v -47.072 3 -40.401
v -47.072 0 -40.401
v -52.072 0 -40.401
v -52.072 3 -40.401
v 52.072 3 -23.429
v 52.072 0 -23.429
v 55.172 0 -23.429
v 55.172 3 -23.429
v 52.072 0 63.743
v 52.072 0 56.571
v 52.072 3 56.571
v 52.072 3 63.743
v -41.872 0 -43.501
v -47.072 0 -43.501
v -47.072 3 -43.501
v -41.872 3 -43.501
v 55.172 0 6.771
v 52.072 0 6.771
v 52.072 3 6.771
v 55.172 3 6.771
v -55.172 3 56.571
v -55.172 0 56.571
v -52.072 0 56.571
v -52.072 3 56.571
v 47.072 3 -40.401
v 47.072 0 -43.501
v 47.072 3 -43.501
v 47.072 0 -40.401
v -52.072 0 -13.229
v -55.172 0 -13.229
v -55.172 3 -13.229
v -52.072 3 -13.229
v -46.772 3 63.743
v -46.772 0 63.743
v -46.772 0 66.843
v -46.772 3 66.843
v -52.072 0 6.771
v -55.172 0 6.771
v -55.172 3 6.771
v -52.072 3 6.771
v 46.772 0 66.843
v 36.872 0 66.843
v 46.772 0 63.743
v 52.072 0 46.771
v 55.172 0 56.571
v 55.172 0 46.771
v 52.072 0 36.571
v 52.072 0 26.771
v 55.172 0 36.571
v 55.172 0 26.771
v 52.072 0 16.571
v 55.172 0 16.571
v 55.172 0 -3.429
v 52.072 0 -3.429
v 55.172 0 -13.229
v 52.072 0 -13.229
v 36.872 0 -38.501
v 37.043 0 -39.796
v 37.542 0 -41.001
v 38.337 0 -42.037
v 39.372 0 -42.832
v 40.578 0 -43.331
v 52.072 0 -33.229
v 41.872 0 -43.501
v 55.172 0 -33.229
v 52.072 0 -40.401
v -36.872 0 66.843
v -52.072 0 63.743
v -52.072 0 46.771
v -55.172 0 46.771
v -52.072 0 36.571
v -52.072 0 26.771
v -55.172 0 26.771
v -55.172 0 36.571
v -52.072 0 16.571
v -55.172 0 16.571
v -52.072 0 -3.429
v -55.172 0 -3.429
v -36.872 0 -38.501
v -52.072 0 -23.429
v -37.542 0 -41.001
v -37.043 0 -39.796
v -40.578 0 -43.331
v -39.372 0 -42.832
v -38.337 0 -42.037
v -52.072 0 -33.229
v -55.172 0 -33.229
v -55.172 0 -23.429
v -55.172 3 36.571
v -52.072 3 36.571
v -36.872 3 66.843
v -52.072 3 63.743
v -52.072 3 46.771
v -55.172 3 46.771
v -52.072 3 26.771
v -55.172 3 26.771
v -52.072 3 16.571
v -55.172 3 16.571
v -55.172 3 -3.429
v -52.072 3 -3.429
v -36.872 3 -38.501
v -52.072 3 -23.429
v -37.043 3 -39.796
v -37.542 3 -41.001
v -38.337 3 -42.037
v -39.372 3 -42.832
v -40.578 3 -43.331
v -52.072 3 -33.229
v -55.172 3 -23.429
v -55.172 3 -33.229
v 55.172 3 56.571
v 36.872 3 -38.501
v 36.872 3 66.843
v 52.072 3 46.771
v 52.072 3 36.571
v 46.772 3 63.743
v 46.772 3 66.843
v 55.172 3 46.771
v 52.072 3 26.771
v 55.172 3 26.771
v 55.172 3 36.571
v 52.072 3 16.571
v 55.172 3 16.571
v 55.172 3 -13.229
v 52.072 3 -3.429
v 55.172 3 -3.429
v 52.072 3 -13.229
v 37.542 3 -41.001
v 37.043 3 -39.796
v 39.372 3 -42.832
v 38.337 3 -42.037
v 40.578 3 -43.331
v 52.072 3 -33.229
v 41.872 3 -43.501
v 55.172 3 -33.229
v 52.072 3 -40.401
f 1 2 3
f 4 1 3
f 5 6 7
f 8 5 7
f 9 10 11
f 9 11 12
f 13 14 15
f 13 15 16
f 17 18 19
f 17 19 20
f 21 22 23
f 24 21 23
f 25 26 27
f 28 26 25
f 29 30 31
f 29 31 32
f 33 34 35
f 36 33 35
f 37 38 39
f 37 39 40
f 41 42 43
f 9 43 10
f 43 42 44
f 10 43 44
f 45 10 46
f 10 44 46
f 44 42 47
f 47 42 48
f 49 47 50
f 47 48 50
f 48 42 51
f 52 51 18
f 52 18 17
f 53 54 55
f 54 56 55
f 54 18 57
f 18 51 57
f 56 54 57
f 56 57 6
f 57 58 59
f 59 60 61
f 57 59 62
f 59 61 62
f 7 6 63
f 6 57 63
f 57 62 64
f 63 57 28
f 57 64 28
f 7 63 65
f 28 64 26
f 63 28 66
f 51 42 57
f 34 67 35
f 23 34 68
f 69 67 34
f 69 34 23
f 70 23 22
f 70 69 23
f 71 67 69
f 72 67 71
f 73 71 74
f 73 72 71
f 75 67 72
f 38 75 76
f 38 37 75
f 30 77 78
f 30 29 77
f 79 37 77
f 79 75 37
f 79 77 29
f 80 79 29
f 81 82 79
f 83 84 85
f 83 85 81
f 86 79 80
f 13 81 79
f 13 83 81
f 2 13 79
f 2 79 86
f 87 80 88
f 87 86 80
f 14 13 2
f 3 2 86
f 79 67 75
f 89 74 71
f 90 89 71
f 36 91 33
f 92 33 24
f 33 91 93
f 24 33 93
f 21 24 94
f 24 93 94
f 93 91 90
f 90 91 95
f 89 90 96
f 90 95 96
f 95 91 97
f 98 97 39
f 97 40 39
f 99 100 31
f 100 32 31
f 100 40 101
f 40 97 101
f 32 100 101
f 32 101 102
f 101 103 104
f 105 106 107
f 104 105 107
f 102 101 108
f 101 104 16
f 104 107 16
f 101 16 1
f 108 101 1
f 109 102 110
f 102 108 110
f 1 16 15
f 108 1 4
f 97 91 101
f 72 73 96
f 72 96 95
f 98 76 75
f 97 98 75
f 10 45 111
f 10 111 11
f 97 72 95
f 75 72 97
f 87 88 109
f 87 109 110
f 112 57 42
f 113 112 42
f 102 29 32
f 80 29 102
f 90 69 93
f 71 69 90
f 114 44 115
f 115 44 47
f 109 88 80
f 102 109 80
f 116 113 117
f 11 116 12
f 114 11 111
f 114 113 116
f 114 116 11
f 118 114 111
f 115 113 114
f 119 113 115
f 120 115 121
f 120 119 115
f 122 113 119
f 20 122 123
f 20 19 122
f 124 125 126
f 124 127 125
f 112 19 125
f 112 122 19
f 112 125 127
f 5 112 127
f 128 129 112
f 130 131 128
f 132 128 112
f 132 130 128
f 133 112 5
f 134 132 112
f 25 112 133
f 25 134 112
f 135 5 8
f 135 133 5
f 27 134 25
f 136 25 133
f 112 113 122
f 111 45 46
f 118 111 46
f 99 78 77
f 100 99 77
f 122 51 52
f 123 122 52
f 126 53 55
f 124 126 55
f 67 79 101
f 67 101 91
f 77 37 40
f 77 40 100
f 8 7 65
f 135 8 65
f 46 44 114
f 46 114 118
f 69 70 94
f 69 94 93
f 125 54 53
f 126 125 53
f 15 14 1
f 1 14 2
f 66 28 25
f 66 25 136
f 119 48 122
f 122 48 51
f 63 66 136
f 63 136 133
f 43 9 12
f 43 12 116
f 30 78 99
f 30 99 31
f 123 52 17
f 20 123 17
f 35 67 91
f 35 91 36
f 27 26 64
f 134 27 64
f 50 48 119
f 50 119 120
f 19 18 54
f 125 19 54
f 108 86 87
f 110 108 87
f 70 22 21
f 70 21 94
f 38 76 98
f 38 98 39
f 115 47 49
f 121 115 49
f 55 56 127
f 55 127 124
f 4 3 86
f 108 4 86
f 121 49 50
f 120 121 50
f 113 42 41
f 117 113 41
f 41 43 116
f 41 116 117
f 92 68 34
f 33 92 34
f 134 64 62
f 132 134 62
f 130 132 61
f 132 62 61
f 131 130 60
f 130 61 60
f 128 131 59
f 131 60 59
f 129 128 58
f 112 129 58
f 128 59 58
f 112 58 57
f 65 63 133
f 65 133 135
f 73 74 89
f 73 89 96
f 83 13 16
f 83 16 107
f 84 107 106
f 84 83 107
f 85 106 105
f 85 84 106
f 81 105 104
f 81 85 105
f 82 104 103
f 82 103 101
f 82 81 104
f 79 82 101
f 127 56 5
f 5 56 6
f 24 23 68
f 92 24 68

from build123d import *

# Parameters (mm, degrees)
BOSS_EXTRUDE1_DEPTH   = 3
BOSS_EXTRUDE1_2_DEPTH = 3
SKETCH2_W             = 3.2
SKETCH2_H             = 10.2
CUT_EXTRUDE1_DEPTH    = 4


with BuildPart() as part:
    # Sketch1 → Boss-Extrude1 (new body)
    with BuildSketch(Plane(origin=(0, 0, 0), x_dir=(1, 0, 0), z_dir=(0, 1, 0))):
        with BuildLine():
            Line((36.872217102, -66.842990858), (55.172217102, -66.842990858))
            Line((55.172217102, -66.842990858), (55.172217102, 43.501443346))
            Line((55.172217102, 43.501443346), (41.872217102, 43.501443346))
            ThreePointArc((41.872217102, 43.501443346), (38.336683196, 42.036977252), (36.872217102, 38.501443346))
            Line((36.872217102, 38.501443346), (36.872217102, -66.842990858))
        make_face()
    extrude(amount=BOSS_EXTRUDE1_DEPTH)


with BuildPart() as body_2:
    # Sketch1 → Boss-Extrude1 2 (new body)
    with BuildSketch(Plane(origin=(0, 0, 0), x_dir=(1, 0, 0), z_dir=(0, 1, 0))):
        with BuildLine():
            Line((-55.172217102, 43.501443346), (-41.872217102, 43.501443346))
            ThreePointArc((-41.872217102, 43.501443346), (-38.336683196, 42.036977252), (-36.872217102, 38.501443346))
            Line((-36.872217102, 38.501443346), (-36.872217102, -66.842990858))
            Line((-36.872217102, -66.842990858), (-55.172217102, -66.842990858))
            Line((-55.172217102, -66.842990858), (-55.172217102, 43.501443346))
        make_face()
    extrude(amount=BOSS_EXTRUDE1_2_DEPTH)


with BuildPart() as cut_extrude1_tool:
    # Sketch2 → Cut-Extrude1 (new body, through all)
    with BuildSketch(Plane(origin=(0, 0, 0), x_dir=(1, 0, 0), z_dir=(0, 1, 0))):
        Polygon((-52.072217102, -56.570773756), (-52.072217102, -63.742990858), (-46.772217102, -63.742990858), (-46.772217102, -66.942990858), (-55.272217102, -66.942990858), (-55.272217102, -56.570773756), align=None)
        with Locations((-53.672217102, -1.670773756)):
            Rectangle(SKETCH2_W, SKETCH2_H)
        with Locations((-53.672217102, 18.329226244)):
            Rectangle(SKETCH2_W, SKETCH2_H)
        with Locations((-53.672217102, -21.670773756)):
            Rectangle(SKETCH2_W, SKETCH2_H)
        with Locations((-53.672217102, -41.670773756)):
            Rectangle(SKETCH2_W, SKETCH2_H)
        with Locations((53.672217102, -41.670773756)):
            Rectangle(SKETCH2_W, SKETCH2_H)
        with Locations((53.672217102, -21.670773756)):
            Rectangle(SKETCH2_W, SKETCH2_H)
        Polygon((52.072217102, -63.742990858), (46.772217102, -63.742990858), (46.772217102, -66.942990858), (55.272217102, -66.942990858), (55.272217102, -56.570773756), (52.072217102, -56.570773756), align=None)
        with Locations((53.672217102, 18.329226244)):
            Rectangle(SKETCH2_W, SKETCH2_H)
        Polygon((52.072217102, 40.401443346), (52.072217102, 33.229226244), (55.272217102, 33.229226244), (55.272217102, 43.601443346), (47.072217102, 43.601443346), (47.072217102, 40.401443346), align=None)
        with Locations((53.672217102, -1.670773756)):
            Rectangle(SKETCH2_W, SKETCH2_H)
        Polygon((-52.072217102, 33.229226244), (-55.272217102, 33.229226244), (-55.272217102, 43.601443346), (-47.072217102, 43.601443346), (-47.072217102, 40.401443346), (-52.072217102, 40.401443346), align=None)
    extrude(amount=CUT_EXTRUDE1_DEPTH)


with BuildPart() as part_1:
    add(part.part)

    # Cut-Extrude1: cut by cut_extrude1_tool
    add(cut_extrude1_tool.part, mode=Mode.SUBTRACT)


with BuildPart() as body_2_1:
    add(body_2.part)

    # Cut-Extrude1: cut by cut_extrude1_tool
    add(cut_extrude1_tool.part, mode=Mode.SUBTRACT)


solid = Compound([part_1.part, body_2_1.part])
